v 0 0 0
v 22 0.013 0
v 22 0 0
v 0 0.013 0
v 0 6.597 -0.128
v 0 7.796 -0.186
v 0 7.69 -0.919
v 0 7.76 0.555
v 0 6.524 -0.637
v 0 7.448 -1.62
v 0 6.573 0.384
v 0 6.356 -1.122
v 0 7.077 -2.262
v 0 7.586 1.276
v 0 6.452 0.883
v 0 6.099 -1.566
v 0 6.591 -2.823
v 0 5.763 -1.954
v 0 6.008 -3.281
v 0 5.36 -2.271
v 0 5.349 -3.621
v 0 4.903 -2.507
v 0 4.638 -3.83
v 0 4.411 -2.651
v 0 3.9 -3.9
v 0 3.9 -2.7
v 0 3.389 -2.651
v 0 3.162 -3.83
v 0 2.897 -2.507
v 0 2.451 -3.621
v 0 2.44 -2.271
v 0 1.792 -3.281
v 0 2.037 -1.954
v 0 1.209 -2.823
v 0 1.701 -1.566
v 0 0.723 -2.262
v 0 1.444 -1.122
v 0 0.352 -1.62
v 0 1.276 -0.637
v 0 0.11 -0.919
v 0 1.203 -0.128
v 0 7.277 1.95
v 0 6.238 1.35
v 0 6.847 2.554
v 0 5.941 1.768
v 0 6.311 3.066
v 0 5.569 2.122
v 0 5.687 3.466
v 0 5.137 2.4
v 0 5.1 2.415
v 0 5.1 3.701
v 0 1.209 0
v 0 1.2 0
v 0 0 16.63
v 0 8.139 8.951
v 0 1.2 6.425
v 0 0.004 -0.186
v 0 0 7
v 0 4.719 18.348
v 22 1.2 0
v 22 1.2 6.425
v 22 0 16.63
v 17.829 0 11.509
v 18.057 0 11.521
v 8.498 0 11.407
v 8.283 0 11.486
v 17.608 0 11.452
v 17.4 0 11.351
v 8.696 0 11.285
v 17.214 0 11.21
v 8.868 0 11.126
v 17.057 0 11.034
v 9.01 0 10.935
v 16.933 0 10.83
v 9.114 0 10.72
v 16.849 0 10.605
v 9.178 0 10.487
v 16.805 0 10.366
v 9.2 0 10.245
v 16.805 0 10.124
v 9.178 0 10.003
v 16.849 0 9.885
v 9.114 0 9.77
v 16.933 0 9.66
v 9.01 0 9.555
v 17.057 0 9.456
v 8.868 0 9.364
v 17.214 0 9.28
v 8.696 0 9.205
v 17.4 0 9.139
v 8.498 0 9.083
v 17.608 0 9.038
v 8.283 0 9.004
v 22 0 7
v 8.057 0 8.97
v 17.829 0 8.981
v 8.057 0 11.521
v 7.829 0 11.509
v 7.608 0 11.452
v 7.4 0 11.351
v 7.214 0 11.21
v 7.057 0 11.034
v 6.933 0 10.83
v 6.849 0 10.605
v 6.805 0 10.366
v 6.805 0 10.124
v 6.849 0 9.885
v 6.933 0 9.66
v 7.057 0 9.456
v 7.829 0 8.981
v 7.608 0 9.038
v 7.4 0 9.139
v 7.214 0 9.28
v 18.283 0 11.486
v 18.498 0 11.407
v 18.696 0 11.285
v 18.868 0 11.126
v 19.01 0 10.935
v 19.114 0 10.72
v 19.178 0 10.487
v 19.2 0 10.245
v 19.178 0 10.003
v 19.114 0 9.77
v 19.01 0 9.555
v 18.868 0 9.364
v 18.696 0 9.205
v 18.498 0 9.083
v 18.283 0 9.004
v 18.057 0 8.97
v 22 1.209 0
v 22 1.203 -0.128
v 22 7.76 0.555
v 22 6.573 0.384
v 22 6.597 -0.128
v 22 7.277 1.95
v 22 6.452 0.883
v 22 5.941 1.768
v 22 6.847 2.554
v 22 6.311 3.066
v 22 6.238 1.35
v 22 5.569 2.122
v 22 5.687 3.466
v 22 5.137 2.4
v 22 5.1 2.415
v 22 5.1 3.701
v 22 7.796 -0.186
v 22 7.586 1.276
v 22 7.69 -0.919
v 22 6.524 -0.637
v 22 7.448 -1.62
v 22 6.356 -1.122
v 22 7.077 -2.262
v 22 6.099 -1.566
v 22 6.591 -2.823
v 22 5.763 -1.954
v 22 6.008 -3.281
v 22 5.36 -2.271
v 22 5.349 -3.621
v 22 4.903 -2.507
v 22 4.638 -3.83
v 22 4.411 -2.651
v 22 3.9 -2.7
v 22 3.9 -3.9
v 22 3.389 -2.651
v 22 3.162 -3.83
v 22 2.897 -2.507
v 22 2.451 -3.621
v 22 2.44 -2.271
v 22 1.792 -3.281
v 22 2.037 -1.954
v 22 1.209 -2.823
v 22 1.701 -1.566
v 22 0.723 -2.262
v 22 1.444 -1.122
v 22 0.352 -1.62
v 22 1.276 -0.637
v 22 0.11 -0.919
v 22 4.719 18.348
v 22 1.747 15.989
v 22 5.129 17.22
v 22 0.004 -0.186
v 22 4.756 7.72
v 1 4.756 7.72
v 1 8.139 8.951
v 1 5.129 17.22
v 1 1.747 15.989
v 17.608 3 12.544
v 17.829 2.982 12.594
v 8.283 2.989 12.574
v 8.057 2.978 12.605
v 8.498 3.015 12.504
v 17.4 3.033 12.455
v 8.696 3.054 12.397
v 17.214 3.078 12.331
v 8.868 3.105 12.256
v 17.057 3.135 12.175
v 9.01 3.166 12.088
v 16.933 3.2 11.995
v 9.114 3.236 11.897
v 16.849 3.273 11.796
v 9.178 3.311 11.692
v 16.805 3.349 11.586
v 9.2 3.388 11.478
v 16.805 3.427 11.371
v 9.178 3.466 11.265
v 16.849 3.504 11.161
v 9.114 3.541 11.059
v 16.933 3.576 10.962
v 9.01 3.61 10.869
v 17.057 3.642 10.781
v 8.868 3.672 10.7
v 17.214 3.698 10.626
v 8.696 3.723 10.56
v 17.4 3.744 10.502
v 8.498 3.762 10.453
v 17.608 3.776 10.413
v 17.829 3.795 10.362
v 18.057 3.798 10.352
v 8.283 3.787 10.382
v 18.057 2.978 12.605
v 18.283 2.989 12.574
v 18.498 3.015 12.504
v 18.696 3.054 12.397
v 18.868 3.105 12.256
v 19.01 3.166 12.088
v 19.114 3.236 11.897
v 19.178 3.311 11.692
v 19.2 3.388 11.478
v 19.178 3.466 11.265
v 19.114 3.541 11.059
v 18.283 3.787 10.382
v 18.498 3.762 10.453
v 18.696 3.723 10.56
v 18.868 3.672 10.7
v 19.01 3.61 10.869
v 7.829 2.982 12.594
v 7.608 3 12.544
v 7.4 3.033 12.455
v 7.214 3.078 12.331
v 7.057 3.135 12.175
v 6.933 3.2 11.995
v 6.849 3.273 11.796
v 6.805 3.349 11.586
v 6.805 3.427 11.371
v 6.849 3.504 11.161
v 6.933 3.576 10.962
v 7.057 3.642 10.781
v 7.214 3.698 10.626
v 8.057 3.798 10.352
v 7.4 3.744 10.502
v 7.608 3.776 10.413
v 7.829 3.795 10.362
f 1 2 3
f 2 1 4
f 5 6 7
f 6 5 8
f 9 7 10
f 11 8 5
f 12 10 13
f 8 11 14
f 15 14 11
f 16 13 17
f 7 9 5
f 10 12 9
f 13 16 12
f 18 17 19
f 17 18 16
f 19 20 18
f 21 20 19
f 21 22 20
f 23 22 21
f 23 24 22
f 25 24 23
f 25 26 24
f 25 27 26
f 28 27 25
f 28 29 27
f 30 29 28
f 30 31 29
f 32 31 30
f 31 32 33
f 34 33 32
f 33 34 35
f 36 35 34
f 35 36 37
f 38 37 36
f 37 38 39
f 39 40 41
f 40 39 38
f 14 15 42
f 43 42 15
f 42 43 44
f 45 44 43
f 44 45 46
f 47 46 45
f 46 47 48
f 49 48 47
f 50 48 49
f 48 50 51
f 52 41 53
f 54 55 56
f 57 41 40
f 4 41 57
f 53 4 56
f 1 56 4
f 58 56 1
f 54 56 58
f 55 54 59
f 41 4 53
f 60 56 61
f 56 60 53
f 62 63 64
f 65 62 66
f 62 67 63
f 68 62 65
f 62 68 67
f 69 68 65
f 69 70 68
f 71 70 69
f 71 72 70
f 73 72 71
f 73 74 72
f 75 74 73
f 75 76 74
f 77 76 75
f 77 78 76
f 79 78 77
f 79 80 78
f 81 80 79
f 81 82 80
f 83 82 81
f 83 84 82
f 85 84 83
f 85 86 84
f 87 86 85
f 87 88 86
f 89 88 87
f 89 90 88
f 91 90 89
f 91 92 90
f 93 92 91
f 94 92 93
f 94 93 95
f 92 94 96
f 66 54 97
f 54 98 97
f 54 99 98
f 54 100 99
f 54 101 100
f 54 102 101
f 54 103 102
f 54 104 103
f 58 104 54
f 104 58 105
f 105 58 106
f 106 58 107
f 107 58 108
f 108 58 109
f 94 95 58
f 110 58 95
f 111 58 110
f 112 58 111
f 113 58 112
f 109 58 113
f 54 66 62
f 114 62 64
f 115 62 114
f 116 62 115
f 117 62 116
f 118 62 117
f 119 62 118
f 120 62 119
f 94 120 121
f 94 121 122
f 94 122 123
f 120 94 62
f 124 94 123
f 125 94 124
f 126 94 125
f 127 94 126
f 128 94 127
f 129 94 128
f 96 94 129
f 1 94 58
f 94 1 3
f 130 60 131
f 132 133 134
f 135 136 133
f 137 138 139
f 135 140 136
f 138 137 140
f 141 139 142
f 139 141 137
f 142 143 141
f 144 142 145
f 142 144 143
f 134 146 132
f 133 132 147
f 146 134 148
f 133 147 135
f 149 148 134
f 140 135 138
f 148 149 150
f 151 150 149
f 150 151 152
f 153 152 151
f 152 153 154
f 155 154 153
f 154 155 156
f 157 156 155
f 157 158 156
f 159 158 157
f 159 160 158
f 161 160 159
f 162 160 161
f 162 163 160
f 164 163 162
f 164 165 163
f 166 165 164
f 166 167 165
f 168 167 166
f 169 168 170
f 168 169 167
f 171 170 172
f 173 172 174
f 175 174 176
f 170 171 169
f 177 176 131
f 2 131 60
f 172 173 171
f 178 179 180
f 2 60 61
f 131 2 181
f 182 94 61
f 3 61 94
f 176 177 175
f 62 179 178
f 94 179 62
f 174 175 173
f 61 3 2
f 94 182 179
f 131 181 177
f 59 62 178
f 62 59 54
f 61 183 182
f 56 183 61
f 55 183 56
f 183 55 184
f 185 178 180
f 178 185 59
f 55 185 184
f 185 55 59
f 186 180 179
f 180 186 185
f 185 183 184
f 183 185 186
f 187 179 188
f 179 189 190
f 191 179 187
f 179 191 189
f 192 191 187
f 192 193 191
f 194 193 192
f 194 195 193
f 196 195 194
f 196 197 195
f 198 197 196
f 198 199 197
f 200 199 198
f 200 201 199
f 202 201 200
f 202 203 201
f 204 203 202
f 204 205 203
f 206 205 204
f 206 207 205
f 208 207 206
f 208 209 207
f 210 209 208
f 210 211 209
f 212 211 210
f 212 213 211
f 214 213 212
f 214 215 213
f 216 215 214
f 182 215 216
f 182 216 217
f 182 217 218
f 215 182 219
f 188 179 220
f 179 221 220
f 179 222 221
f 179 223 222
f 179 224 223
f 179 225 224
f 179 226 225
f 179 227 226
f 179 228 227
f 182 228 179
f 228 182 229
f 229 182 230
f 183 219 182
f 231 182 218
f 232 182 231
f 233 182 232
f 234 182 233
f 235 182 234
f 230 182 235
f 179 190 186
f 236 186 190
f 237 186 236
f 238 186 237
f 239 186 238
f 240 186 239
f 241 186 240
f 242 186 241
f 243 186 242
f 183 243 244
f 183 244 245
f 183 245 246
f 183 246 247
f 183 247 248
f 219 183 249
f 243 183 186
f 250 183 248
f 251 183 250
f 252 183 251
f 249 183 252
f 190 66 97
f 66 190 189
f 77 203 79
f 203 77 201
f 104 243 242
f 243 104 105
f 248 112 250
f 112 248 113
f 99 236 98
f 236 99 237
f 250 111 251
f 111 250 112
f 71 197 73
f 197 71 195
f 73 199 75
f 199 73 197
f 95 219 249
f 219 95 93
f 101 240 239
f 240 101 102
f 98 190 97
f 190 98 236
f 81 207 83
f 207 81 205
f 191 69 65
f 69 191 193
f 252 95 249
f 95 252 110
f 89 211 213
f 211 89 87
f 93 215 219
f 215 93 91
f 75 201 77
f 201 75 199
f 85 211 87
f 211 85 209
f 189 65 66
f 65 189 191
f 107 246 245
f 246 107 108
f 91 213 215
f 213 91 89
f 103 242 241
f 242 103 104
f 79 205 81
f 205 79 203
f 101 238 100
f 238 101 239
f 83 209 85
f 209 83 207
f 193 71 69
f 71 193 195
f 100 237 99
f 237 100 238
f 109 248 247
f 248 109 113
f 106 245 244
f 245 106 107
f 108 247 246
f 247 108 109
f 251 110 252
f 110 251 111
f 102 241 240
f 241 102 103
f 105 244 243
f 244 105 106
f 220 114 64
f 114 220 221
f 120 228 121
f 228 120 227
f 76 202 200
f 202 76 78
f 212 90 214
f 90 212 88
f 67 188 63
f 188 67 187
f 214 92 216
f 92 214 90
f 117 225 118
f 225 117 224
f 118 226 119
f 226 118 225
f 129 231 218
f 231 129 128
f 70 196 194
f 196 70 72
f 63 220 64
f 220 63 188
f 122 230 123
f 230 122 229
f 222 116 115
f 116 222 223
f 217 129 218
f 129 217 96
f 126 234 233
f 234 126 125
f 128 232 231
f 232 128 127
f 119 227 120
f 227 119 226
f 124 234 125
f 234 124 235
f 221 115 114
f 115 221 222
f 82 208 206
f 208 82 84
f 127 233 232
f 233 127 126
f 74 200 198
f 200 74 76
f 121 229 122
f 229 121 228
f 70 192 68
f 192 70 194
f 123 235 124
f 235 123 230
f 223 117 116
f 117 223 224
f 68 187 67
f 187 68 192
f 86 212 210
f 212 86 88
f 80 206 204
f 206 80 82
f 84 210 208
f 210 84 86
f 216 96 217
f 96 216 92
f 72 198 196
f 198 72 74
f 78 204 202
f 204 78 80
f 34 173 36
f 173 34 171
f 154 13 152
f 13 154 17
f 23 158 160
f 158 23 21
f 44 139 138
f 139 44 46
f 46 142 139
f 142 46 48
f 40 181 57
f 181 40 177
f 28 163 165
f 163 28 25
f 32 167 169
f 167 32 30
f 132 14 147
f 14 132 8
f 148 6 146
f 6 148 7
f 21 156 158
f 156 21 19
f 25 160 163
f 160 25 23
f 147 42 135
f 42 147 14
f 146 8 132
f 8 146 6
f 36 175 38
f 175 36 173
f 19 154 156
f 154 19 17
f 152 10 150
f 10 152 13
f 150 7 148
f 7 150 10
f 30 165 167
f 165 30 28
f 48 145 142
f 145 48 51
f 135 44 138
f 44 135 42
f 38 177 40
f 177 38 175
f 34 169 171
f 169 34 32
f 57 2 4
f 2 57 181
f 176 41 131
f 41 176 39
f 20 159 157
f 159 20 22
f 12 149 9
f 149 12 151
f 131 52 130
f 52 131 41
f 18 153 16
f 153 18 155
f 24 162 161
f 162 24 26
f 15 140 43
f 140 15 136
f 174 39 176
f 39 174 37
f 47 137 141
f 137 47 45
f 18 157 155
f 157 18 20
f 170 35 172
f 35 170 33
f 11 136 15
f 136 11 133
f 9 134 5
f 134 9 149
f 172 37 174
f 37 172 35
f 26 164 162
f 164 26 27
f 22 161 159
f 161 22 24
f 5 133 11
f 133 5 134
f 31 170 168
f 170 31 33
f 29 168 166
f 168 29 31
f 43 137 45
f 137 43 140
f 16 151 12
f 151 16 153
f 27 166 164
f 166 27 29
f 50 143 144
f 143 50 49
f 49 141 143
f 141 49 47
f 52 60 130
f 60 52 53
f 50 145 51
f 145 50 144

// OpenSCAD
// file: ../Parts/rounder.scad
// rounder.scad
// cutting tool for rounding off corners with a cylinder

//---------------------
module rounder(
r=10,   // radius
h=10,   // height
f=22,    // $fn
extra=0.01  // extra size for the cube
){

difference(){
  translate([-extra,-extra,-extra])
  cube([r+extra,r+extra,h+2*extra]);
  translate([r,r,-1])
  cylinder(r=r,h=h+2,$fn=f);
}

}

//---------------------------------------------------------------------------
module bevel(x=1,y=1,h=10){

linear_extrude(height=h)
polygon(points=[[0,0],[x,0],[0,y]]);
    
}
  

//========================

rounder();

//========================
// main file
//======================================================================
// CableHangers.scad
//
//
// DrTomFlint 14 Dec 2024
//
//======================================================================

use <../Parts/rounder.scad>

//----------------------------------------------------------------------
module plug1(){

	difference(){
		// main body
		cylinder(r1=12,r2=5.0,h=25.4,$fn=88);
		// bore for fiber optic cable
		cylinder(r=1.5,h=70,center=true,$fn=22);
		// slot for inserting cable
		translate([-0.25,0,-1])
		cube([0.5,30,30]);
	}
	
}

//----------------------------------------------------------------------
module hang1(){
wide=26;
thick=1.2;
gap=7;

// gap
difference(){
  cube([wide,thick,gap]);
  translate([22,-1,-10])
  cube([10,8*thick,30]);
}

// staple attachment
difference(){
  translate([0,2.2*thick,-0.5])
  rotate([20,0,0])
  difference(){
    translate([-(26-wide)/2,0,gap])
    cube([26,7*thick,10]);
    translate([-(24-wide)/2,4*thick,gap])
    cube([24,7*thick,10-thick]);
    translate([(wide-10)/2,3*thick,gap+4])
    rotate([90,0,0])
    cylinder(r=1.2,h=10,center=true,$fn=33);
    translate([(wide-10)/2+10,3*thick,gap+4])
    rotate([90,0,0])
    cylinder(r=1.2,h=10,center=true,$fn=33);
  }
  translate([-2,-3*thick,gap-2])
  cube([34,3*thick,15]);
  translate([22,-1,-10])
  cube([10,8*thick,30]);
}

// fiber clip
difference(){
  translate([0,thick+2.4,0])
  rotate([0,90,0])
  cylinder(r=2.4+thick,h=wide,$fn=33);
  translate([0,thick+2.4,0])
  rotate([0,90,0])
  cylinder(r=2.4,h=wide,$fn=33);

  translate([0,thick,0])
  cube([wide,2*thick+1.5,5]);
  translate([22,-1,-10])
  cube([10,8*thick,30]);
}



}
//----------------------------------------------------------------------
module hang2(){

gap=7;
wide=26;
thick=2.1;
rmin=50;
off=32;

    translate([-off,-off,0])
    rounder(r=10,h=3+thick,f=66);

  difference(){
    cylinder(r=rmin+thick+1,h=3+thick,$fn=200);
    translate([-off,-off,-1])
    cube([100,100,10]);
    
    translate([0,0,thick+2])
    rotate_extrude($fn=99){
      translate([rmin,0])
      circle(r=1.7,$fn=33);
    }

    translate([0.7*rmin,-0.75*rmin,thick+2])
    rotate([0,0,39])
    cube([25,6,4],center=true);

    translate([-0.75*rmin,0.7*rmin,thick+2])
    rotate([0,0,39])
    cube([25,6,4],center=true);

// cut text for Version
  translate ([-rmin*0.25,-rmin*0.75,3+thick-0.6]) color("red") 
  linear_extrude(height=0.6)
  text("2024", font = "Open Sans:style=Bold", size=6,halign="center",valign="center",spacing=1.2);

  translate ([-rmin*0.75,-rmin*0.25,3+thick-0.6]) color("red") 
  rotate([0,0,-90])
  linear_extrude(height=0.6)
  text("FLINT", font = "Open Sans:style=Bold", size=6,halign="center",valign="center",spacing=1.2);

  }

  // tabs for stapler
  translate([0,-off,22])
  rotate([180,0,0])
  staple();

  translate([-off,25,22])
  rotate([0,0,-90])
  rotate([180,0,0])
  staple();


}

//----------------------------------------------------------------------
module staple(){
wide=26;
thick=1.2;
gap=7;
  
// staple attachment
difference(){
  translate([0,0,0])
  //~ translate([0,2.2*thick,-0.5])
  //~ rotate([20,0,0])
  difference(){
    translate([-(26-wide)/2,0,gap])
    cube([26,7*thick,10]);
    translate([-(24-wide)/2,4*thick,gap])
    cube([24,7*thick,10-thick]);
    translate([(wide-10)/2,3*thick,gap+4])
    rotate([90,0,0])
    cylinder(r=1.2,h=10,center=true,$fn=33);
    translate([(wide-10)/2+10,3*thick,gap+4])
    rotate([90,0,0])
    cylinder(r=1.2,h=10,center=true,$fn=33);
  }
  translate([-2,-3*thick,gap-2])
  cube([34,3*thick,15]);
  translate([22,-1,-10])
  cube([10,8*thick,30]);
}

}

//----------------------------------------------------------------------
module hang3(){

gap=7;
wide=26;
thick=2.1;
rmin=50;
off=32;

  difference(){
    hull(){
      translate([-rmin-3,-rmin-3,0])
      cube([20,20,3+thick]);
      cylinder(r=rmin+thick+1,h=3+thick,$fn=200);
    }
    cylinder(r=rmin-6,h=3+thick,$fn=200);

    translate([-100,0,-1])
    cube([200,200,10]);
    translate([0,-100,-1])
    cube([200,200,10]);
    
    translate([0,0,thick+2])
    rotate_extrude($fn=99){
      translate([rmin,0])
      circle(r=1.7,$fn=33);
    }

    translate([0.7*rmin,-0.75*rmin,thick+2])
    rotate([0,0,39])
    cube([25,6,4],center=true);

    translate([-0.75*rmin,0.7*rmin,thick+2])
    rotate([0,0,39])
    cube([25,6,4],center=true);

    translate([-rmin-3.5,-rmin-3.5,-2])
    rotate([0,0,0])
    rounder(r=10,h=20,f=44);

    translate([-rmin*0.8,-rmin*0.8,-2])
    cylinder(r=3,h=4*thick,$fn=200);

  }

  // tabs for stapler
  translate([-rmin-3,-rmin-3+7.5,22])
  rotate([0,0,90])
  rotate([180,0,0])
  staple();

  translate([-rmin-3+7.5,-rmin-3,22])
  mirror([0,0,1])
  staple();


}
//----------------------------------------------------------------------
module hang4(){
  
gap=7;
wide=26;
thick=2.1;
rmin=50;
off=32;


  // tip
  difference(){
    union(){
      rotate([0,0,32])
      translate([2*rmin,0,0])
      cylinder(r=rmin+thick+1,h=3+thick,$fn=200);
      translate([40,0,0])
      cube([40,rmin,thick+3]);
    }
    
    rotate([0,0,32])
    translate([2*rmin,0,0])
    cylinder(r=rmin-3,h=5*thick,center=true,$fn=200);

    rotate([0,0,32])
    translate([2*rmin,0,0])
    translate([0,0,thick+2])
    rotate([0,0,180])
    rotate_extrude($fn=99,angle=180){
      translate([rmin,0])
      circle(r=1.7,$fn=33);
    }

    rotate([0,0,32])
    translate([2*rmin,2*rmin,thick+3])
    cube([4*rmin,4*rmin,5*thick],center=true);
    translate([3.8*rmin,0,thick+3])
    cube([4*rmin,4*rmin,5*thick],center=true);
  }
  
  // main loop
  difference(){
    cylinder(r=rmin+thick+1,h=3+thick,$fn=200);
    
    translate([0,0,thick+2])
    rotate([0,0,32])
    rotate_extrude($fn=99,angle=180){
      translate([rmin,0])
      circle(r=1.7,$fn=33);
    }
    rotate([0,0,32])
    translate([2*rmin,0,0])
    translate([0,0,thick+2])
    rotate([0,0,180])
    rotate_extrude($fn=99,angle=180){
      translate([rmin,0])
      circle(r=1.7,$fn=33);
    }

    translate([0,-2*rmin,thick+3])
    cube([4*rmin,4*rmin,5*thick],center=true);

    translate([12,0,-1])
    cylinder(r=0.5*rmin,h=5*thick,$fn=200);

    translate([2,40,-1])
    cylinder(r=4,h=5*thick,$fn=200);

// cut text for Version
  translate ([-15,35,3+thick-0.6]) color("red")   
  rotate([0,0,200])
  linear_extrude(height=0.6)
  text("2024", font = "Open Sans:style=Bold", size=6,halign="center",valign="center",spacing=1.2);

  translate ([20,33,3+thick-0.6]) color("red")   
  rotate([0,0,150])
  linear_extrude(height=0.6)
  text("FLINT", font = "Open Sans:style=Bold", size=6,halign="center",valign="center",spacing=1.2);

    translate([-rmin,5,thick+3])
    cube([30,11,5*thick],center=true);
  }

  // tabs for stapler
  translate([-35,0,22])
  mirror([1,0,0])
  rotate([0,0,180])
  rotate([180,0,0])
  staple();

  translate([35,0,22])
  mirror([1,0,0])
  rotate([0,0,180])
  rotate([180,0,0])
  staple();

}

//----------------------------------------------------------------------
// adjust for use with Ethernet cables
module hangEther(){
wide=26;
thick=1.2;
gap=7;

// gap
difference(){
  cube([wide,thick,gap]);
  translate([22,-1,-10])
  cube([10,8*thick,30]);
}

// staple attachment
difference(){
  translate([0,2.2*thick,-0.5])
  rotate([20,0,0])
  difference(){
    translate([-(26-wide)/2,0,gap])
    cube([26,7*thick,10]);
    translate([-(24-wide)/2,4*thick,gap])
    cube([24,7*thick,10-thick]);
    translate([(wide-10)/2,3*thick,gap+4])
    rotate([90,0,0])
    cylinder(r=1.2,h=10,center=true,$fn=33);
    translate([(wide-10)/2+10,3*thick,gap+4])
    rotate([90,0,0])
    cylinder(r=1.2,h=10,center=true,$fn=33);
  }
  translate([-2,-3*thick,gap-2])
  cube([34,3*thick,15]);
  translate([22,-1,-10])
  cube([10,8*thick,30]);
}

// fiber clip
difference(){
  translate([0,thick+2.7,0])
  rotate([0,90,0])
  cylinder(r=2.7+thick,h=wide,$fn=33);
  translate([0,thick+2.7,0])
  rotate([0,90,0])
  cylinder(r=2.7,h=wide,$fn=33);

  translate([0,thick,0])
  cube([wide,2*thick+1.5,5]);
  translate([22,-1,-10])
  cube([10,8*thick,30]);
}



}

//======================================================================

//~ plug1();

//~ mirror([1,0,0])
//~ hang1();

hangEther();

//~ hang2();

//~ hang3();

//~ hang4();

//~ staple();

// Print N copies of hang1 add 2 cubes to improve bed adhesion
if(0){
  N=15;
  for(i=[0:N-1]){
    translate([0,i*15,0])
    mirror([1,0,0])
    hang1();
  }
  translate([-0.6,-5,15])
  cube([0.6,15*N,1.2]);
  translate([-0.6,-5,-2.5])
  cube([0.6,15*N,1.2]);
}

//======================================================================
